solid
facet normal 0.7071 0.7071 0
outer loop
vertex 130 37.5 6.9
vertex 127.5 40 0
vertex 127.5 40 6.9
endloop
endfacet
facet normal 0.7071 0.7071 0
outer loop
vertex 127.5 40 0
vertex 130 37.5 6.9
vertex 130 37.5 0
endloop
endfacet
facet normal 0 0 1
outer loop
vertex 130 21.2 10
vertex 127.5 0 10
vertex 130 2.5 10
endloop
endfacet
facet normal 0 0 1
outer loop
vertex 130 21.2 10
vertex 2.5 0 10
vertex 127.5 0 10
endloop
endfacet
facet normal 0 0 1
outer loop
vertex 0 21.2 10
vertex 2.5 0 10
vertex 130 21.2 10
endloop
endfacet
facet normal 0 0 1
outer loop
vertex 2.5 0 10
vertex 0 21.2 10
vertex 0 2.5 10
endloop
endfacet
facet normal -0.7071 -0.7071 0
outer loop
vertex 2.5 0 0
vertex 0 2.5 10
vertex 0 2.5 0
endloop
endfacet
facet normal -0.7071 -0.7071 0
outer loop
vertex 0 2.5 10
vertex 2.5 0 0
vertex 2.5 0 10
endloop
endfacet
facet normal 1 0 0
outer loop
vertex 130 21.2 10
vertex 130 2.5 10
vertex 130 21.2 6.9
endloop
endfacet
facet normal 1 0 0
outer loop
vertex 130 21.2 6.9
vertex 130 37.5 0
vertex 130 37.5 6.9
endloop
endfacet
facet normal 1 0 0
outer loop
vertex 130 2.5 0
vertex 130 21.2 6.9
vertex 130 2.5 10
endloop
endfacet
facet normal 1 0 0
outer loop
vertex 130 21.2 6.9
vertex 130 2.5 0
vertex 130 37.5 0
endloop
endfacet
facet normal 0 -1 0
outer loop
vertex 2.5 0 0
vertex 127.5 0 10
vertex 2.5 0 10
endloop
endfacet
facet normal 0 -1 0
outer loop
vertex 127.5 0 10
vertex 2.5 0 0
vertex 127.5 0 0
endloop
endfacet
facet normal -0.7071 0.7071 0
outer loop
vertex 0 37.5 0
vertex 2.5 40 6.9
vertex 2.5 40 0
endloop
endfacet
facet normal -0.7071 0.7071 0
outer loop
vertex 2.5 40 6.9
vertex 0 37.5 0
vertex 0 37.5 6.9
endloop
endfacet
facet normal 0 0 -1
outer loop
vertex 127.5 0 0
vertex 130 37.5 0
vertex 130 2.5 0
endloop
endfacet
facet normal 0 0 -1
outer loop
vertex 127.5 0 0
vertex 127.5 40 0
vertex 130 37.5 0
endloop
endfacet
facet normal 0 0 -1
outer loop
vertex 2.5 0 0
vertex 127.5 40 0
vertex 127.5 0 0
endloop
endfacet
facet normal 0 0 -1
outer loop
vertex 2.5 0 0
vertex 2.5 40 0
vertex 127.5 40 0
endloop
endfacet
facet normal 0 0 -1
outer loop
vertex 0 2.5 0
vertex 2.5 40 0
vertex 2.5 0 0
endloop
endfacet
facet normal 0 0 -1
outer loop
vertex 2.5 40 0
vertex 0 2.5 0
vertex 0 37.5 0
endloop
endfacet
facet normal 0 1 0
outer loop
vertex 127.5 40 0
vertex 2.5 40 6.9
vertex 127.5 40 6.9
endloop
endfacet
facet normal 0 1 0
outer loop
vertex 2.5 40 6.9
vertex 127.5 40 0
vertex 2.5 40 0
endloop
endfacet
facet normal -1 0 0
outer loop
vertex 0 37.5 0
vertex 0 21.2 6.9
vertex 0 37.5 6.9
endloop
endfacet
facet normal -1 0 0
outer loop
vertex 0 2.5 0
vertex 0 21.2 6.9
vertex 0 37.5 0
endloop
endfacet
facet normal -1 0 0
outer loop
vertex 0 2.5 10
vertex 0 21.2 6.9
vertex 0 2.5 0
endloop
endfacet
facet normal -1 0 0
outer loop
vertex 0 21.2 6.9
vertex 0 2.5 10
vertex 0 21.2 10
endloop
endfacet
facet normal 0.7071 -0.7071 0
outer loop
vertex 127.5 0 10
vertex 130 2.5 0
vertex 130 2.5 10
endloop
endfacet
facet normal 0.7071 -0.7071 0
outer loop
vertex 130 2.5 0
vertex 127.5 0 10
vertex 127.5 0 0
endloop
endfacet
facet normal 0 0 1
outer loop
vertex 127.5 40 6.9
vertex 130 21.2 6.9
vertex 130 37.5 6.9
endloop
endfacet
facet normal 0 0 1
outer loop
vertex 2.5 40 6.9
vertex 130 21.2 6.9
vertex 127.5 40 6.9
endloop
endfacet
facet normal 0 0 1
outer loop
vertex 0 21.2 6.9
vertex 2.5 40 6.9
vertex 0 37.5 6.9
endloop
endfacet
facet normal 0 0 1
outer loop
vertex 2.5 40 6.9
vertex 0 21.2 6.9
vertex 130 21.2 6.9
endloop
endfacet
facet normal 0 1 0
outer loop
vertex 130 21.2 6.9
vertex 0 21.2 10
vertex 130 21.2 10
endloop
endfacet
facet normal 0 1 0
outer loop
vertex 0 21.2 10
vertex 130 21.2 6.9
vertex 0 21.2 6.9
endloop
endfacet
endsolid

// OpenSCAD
$fn = 32;

// ----------------------------------------------------------------------
// Stepped bar: sidestep, 130 x 40 x 10/6.9 mm
// ----------------------------------------------------------------------

// --- parameters (mm) ---
bar_l = 130;              // bar length, X
bar_w = 40;               // bar width, Y
plate_t = 10;             // thickness of the thick zone, Z
thin_t = 6.9;             // thickness of the thin zone
corner_c = 2.5;           // corner chamfer of the bar
step_cut = 3.1;           // material removed from the thin zone
ledge_y = 21.2;           // start of the ledge from the front edge
depth_1 = 3.1;            // depth of cut 1 from the top face

profile = [[2.5, 0], [127.5, 0], [130, 2.5], [130, 37.5], [127.5, 40], [2.5, 40], [0, 37.5], [0, 2.5]];  // primary outline, 8 points, counter clockwise
void_1 = [[-1, 21.2], [131, 21.2], [131, 41], [-1, 41]];  // ledge cut along one edge, 4 points

// --- the one profile operation ---
difference() {
  linear_extrude(height = plate_t) polygon(points = profile);
  translate([0, 0, plate_t - depth_1])
    linear_extrude(height = depth_1 + 1) polygon(points = void_1);
}
